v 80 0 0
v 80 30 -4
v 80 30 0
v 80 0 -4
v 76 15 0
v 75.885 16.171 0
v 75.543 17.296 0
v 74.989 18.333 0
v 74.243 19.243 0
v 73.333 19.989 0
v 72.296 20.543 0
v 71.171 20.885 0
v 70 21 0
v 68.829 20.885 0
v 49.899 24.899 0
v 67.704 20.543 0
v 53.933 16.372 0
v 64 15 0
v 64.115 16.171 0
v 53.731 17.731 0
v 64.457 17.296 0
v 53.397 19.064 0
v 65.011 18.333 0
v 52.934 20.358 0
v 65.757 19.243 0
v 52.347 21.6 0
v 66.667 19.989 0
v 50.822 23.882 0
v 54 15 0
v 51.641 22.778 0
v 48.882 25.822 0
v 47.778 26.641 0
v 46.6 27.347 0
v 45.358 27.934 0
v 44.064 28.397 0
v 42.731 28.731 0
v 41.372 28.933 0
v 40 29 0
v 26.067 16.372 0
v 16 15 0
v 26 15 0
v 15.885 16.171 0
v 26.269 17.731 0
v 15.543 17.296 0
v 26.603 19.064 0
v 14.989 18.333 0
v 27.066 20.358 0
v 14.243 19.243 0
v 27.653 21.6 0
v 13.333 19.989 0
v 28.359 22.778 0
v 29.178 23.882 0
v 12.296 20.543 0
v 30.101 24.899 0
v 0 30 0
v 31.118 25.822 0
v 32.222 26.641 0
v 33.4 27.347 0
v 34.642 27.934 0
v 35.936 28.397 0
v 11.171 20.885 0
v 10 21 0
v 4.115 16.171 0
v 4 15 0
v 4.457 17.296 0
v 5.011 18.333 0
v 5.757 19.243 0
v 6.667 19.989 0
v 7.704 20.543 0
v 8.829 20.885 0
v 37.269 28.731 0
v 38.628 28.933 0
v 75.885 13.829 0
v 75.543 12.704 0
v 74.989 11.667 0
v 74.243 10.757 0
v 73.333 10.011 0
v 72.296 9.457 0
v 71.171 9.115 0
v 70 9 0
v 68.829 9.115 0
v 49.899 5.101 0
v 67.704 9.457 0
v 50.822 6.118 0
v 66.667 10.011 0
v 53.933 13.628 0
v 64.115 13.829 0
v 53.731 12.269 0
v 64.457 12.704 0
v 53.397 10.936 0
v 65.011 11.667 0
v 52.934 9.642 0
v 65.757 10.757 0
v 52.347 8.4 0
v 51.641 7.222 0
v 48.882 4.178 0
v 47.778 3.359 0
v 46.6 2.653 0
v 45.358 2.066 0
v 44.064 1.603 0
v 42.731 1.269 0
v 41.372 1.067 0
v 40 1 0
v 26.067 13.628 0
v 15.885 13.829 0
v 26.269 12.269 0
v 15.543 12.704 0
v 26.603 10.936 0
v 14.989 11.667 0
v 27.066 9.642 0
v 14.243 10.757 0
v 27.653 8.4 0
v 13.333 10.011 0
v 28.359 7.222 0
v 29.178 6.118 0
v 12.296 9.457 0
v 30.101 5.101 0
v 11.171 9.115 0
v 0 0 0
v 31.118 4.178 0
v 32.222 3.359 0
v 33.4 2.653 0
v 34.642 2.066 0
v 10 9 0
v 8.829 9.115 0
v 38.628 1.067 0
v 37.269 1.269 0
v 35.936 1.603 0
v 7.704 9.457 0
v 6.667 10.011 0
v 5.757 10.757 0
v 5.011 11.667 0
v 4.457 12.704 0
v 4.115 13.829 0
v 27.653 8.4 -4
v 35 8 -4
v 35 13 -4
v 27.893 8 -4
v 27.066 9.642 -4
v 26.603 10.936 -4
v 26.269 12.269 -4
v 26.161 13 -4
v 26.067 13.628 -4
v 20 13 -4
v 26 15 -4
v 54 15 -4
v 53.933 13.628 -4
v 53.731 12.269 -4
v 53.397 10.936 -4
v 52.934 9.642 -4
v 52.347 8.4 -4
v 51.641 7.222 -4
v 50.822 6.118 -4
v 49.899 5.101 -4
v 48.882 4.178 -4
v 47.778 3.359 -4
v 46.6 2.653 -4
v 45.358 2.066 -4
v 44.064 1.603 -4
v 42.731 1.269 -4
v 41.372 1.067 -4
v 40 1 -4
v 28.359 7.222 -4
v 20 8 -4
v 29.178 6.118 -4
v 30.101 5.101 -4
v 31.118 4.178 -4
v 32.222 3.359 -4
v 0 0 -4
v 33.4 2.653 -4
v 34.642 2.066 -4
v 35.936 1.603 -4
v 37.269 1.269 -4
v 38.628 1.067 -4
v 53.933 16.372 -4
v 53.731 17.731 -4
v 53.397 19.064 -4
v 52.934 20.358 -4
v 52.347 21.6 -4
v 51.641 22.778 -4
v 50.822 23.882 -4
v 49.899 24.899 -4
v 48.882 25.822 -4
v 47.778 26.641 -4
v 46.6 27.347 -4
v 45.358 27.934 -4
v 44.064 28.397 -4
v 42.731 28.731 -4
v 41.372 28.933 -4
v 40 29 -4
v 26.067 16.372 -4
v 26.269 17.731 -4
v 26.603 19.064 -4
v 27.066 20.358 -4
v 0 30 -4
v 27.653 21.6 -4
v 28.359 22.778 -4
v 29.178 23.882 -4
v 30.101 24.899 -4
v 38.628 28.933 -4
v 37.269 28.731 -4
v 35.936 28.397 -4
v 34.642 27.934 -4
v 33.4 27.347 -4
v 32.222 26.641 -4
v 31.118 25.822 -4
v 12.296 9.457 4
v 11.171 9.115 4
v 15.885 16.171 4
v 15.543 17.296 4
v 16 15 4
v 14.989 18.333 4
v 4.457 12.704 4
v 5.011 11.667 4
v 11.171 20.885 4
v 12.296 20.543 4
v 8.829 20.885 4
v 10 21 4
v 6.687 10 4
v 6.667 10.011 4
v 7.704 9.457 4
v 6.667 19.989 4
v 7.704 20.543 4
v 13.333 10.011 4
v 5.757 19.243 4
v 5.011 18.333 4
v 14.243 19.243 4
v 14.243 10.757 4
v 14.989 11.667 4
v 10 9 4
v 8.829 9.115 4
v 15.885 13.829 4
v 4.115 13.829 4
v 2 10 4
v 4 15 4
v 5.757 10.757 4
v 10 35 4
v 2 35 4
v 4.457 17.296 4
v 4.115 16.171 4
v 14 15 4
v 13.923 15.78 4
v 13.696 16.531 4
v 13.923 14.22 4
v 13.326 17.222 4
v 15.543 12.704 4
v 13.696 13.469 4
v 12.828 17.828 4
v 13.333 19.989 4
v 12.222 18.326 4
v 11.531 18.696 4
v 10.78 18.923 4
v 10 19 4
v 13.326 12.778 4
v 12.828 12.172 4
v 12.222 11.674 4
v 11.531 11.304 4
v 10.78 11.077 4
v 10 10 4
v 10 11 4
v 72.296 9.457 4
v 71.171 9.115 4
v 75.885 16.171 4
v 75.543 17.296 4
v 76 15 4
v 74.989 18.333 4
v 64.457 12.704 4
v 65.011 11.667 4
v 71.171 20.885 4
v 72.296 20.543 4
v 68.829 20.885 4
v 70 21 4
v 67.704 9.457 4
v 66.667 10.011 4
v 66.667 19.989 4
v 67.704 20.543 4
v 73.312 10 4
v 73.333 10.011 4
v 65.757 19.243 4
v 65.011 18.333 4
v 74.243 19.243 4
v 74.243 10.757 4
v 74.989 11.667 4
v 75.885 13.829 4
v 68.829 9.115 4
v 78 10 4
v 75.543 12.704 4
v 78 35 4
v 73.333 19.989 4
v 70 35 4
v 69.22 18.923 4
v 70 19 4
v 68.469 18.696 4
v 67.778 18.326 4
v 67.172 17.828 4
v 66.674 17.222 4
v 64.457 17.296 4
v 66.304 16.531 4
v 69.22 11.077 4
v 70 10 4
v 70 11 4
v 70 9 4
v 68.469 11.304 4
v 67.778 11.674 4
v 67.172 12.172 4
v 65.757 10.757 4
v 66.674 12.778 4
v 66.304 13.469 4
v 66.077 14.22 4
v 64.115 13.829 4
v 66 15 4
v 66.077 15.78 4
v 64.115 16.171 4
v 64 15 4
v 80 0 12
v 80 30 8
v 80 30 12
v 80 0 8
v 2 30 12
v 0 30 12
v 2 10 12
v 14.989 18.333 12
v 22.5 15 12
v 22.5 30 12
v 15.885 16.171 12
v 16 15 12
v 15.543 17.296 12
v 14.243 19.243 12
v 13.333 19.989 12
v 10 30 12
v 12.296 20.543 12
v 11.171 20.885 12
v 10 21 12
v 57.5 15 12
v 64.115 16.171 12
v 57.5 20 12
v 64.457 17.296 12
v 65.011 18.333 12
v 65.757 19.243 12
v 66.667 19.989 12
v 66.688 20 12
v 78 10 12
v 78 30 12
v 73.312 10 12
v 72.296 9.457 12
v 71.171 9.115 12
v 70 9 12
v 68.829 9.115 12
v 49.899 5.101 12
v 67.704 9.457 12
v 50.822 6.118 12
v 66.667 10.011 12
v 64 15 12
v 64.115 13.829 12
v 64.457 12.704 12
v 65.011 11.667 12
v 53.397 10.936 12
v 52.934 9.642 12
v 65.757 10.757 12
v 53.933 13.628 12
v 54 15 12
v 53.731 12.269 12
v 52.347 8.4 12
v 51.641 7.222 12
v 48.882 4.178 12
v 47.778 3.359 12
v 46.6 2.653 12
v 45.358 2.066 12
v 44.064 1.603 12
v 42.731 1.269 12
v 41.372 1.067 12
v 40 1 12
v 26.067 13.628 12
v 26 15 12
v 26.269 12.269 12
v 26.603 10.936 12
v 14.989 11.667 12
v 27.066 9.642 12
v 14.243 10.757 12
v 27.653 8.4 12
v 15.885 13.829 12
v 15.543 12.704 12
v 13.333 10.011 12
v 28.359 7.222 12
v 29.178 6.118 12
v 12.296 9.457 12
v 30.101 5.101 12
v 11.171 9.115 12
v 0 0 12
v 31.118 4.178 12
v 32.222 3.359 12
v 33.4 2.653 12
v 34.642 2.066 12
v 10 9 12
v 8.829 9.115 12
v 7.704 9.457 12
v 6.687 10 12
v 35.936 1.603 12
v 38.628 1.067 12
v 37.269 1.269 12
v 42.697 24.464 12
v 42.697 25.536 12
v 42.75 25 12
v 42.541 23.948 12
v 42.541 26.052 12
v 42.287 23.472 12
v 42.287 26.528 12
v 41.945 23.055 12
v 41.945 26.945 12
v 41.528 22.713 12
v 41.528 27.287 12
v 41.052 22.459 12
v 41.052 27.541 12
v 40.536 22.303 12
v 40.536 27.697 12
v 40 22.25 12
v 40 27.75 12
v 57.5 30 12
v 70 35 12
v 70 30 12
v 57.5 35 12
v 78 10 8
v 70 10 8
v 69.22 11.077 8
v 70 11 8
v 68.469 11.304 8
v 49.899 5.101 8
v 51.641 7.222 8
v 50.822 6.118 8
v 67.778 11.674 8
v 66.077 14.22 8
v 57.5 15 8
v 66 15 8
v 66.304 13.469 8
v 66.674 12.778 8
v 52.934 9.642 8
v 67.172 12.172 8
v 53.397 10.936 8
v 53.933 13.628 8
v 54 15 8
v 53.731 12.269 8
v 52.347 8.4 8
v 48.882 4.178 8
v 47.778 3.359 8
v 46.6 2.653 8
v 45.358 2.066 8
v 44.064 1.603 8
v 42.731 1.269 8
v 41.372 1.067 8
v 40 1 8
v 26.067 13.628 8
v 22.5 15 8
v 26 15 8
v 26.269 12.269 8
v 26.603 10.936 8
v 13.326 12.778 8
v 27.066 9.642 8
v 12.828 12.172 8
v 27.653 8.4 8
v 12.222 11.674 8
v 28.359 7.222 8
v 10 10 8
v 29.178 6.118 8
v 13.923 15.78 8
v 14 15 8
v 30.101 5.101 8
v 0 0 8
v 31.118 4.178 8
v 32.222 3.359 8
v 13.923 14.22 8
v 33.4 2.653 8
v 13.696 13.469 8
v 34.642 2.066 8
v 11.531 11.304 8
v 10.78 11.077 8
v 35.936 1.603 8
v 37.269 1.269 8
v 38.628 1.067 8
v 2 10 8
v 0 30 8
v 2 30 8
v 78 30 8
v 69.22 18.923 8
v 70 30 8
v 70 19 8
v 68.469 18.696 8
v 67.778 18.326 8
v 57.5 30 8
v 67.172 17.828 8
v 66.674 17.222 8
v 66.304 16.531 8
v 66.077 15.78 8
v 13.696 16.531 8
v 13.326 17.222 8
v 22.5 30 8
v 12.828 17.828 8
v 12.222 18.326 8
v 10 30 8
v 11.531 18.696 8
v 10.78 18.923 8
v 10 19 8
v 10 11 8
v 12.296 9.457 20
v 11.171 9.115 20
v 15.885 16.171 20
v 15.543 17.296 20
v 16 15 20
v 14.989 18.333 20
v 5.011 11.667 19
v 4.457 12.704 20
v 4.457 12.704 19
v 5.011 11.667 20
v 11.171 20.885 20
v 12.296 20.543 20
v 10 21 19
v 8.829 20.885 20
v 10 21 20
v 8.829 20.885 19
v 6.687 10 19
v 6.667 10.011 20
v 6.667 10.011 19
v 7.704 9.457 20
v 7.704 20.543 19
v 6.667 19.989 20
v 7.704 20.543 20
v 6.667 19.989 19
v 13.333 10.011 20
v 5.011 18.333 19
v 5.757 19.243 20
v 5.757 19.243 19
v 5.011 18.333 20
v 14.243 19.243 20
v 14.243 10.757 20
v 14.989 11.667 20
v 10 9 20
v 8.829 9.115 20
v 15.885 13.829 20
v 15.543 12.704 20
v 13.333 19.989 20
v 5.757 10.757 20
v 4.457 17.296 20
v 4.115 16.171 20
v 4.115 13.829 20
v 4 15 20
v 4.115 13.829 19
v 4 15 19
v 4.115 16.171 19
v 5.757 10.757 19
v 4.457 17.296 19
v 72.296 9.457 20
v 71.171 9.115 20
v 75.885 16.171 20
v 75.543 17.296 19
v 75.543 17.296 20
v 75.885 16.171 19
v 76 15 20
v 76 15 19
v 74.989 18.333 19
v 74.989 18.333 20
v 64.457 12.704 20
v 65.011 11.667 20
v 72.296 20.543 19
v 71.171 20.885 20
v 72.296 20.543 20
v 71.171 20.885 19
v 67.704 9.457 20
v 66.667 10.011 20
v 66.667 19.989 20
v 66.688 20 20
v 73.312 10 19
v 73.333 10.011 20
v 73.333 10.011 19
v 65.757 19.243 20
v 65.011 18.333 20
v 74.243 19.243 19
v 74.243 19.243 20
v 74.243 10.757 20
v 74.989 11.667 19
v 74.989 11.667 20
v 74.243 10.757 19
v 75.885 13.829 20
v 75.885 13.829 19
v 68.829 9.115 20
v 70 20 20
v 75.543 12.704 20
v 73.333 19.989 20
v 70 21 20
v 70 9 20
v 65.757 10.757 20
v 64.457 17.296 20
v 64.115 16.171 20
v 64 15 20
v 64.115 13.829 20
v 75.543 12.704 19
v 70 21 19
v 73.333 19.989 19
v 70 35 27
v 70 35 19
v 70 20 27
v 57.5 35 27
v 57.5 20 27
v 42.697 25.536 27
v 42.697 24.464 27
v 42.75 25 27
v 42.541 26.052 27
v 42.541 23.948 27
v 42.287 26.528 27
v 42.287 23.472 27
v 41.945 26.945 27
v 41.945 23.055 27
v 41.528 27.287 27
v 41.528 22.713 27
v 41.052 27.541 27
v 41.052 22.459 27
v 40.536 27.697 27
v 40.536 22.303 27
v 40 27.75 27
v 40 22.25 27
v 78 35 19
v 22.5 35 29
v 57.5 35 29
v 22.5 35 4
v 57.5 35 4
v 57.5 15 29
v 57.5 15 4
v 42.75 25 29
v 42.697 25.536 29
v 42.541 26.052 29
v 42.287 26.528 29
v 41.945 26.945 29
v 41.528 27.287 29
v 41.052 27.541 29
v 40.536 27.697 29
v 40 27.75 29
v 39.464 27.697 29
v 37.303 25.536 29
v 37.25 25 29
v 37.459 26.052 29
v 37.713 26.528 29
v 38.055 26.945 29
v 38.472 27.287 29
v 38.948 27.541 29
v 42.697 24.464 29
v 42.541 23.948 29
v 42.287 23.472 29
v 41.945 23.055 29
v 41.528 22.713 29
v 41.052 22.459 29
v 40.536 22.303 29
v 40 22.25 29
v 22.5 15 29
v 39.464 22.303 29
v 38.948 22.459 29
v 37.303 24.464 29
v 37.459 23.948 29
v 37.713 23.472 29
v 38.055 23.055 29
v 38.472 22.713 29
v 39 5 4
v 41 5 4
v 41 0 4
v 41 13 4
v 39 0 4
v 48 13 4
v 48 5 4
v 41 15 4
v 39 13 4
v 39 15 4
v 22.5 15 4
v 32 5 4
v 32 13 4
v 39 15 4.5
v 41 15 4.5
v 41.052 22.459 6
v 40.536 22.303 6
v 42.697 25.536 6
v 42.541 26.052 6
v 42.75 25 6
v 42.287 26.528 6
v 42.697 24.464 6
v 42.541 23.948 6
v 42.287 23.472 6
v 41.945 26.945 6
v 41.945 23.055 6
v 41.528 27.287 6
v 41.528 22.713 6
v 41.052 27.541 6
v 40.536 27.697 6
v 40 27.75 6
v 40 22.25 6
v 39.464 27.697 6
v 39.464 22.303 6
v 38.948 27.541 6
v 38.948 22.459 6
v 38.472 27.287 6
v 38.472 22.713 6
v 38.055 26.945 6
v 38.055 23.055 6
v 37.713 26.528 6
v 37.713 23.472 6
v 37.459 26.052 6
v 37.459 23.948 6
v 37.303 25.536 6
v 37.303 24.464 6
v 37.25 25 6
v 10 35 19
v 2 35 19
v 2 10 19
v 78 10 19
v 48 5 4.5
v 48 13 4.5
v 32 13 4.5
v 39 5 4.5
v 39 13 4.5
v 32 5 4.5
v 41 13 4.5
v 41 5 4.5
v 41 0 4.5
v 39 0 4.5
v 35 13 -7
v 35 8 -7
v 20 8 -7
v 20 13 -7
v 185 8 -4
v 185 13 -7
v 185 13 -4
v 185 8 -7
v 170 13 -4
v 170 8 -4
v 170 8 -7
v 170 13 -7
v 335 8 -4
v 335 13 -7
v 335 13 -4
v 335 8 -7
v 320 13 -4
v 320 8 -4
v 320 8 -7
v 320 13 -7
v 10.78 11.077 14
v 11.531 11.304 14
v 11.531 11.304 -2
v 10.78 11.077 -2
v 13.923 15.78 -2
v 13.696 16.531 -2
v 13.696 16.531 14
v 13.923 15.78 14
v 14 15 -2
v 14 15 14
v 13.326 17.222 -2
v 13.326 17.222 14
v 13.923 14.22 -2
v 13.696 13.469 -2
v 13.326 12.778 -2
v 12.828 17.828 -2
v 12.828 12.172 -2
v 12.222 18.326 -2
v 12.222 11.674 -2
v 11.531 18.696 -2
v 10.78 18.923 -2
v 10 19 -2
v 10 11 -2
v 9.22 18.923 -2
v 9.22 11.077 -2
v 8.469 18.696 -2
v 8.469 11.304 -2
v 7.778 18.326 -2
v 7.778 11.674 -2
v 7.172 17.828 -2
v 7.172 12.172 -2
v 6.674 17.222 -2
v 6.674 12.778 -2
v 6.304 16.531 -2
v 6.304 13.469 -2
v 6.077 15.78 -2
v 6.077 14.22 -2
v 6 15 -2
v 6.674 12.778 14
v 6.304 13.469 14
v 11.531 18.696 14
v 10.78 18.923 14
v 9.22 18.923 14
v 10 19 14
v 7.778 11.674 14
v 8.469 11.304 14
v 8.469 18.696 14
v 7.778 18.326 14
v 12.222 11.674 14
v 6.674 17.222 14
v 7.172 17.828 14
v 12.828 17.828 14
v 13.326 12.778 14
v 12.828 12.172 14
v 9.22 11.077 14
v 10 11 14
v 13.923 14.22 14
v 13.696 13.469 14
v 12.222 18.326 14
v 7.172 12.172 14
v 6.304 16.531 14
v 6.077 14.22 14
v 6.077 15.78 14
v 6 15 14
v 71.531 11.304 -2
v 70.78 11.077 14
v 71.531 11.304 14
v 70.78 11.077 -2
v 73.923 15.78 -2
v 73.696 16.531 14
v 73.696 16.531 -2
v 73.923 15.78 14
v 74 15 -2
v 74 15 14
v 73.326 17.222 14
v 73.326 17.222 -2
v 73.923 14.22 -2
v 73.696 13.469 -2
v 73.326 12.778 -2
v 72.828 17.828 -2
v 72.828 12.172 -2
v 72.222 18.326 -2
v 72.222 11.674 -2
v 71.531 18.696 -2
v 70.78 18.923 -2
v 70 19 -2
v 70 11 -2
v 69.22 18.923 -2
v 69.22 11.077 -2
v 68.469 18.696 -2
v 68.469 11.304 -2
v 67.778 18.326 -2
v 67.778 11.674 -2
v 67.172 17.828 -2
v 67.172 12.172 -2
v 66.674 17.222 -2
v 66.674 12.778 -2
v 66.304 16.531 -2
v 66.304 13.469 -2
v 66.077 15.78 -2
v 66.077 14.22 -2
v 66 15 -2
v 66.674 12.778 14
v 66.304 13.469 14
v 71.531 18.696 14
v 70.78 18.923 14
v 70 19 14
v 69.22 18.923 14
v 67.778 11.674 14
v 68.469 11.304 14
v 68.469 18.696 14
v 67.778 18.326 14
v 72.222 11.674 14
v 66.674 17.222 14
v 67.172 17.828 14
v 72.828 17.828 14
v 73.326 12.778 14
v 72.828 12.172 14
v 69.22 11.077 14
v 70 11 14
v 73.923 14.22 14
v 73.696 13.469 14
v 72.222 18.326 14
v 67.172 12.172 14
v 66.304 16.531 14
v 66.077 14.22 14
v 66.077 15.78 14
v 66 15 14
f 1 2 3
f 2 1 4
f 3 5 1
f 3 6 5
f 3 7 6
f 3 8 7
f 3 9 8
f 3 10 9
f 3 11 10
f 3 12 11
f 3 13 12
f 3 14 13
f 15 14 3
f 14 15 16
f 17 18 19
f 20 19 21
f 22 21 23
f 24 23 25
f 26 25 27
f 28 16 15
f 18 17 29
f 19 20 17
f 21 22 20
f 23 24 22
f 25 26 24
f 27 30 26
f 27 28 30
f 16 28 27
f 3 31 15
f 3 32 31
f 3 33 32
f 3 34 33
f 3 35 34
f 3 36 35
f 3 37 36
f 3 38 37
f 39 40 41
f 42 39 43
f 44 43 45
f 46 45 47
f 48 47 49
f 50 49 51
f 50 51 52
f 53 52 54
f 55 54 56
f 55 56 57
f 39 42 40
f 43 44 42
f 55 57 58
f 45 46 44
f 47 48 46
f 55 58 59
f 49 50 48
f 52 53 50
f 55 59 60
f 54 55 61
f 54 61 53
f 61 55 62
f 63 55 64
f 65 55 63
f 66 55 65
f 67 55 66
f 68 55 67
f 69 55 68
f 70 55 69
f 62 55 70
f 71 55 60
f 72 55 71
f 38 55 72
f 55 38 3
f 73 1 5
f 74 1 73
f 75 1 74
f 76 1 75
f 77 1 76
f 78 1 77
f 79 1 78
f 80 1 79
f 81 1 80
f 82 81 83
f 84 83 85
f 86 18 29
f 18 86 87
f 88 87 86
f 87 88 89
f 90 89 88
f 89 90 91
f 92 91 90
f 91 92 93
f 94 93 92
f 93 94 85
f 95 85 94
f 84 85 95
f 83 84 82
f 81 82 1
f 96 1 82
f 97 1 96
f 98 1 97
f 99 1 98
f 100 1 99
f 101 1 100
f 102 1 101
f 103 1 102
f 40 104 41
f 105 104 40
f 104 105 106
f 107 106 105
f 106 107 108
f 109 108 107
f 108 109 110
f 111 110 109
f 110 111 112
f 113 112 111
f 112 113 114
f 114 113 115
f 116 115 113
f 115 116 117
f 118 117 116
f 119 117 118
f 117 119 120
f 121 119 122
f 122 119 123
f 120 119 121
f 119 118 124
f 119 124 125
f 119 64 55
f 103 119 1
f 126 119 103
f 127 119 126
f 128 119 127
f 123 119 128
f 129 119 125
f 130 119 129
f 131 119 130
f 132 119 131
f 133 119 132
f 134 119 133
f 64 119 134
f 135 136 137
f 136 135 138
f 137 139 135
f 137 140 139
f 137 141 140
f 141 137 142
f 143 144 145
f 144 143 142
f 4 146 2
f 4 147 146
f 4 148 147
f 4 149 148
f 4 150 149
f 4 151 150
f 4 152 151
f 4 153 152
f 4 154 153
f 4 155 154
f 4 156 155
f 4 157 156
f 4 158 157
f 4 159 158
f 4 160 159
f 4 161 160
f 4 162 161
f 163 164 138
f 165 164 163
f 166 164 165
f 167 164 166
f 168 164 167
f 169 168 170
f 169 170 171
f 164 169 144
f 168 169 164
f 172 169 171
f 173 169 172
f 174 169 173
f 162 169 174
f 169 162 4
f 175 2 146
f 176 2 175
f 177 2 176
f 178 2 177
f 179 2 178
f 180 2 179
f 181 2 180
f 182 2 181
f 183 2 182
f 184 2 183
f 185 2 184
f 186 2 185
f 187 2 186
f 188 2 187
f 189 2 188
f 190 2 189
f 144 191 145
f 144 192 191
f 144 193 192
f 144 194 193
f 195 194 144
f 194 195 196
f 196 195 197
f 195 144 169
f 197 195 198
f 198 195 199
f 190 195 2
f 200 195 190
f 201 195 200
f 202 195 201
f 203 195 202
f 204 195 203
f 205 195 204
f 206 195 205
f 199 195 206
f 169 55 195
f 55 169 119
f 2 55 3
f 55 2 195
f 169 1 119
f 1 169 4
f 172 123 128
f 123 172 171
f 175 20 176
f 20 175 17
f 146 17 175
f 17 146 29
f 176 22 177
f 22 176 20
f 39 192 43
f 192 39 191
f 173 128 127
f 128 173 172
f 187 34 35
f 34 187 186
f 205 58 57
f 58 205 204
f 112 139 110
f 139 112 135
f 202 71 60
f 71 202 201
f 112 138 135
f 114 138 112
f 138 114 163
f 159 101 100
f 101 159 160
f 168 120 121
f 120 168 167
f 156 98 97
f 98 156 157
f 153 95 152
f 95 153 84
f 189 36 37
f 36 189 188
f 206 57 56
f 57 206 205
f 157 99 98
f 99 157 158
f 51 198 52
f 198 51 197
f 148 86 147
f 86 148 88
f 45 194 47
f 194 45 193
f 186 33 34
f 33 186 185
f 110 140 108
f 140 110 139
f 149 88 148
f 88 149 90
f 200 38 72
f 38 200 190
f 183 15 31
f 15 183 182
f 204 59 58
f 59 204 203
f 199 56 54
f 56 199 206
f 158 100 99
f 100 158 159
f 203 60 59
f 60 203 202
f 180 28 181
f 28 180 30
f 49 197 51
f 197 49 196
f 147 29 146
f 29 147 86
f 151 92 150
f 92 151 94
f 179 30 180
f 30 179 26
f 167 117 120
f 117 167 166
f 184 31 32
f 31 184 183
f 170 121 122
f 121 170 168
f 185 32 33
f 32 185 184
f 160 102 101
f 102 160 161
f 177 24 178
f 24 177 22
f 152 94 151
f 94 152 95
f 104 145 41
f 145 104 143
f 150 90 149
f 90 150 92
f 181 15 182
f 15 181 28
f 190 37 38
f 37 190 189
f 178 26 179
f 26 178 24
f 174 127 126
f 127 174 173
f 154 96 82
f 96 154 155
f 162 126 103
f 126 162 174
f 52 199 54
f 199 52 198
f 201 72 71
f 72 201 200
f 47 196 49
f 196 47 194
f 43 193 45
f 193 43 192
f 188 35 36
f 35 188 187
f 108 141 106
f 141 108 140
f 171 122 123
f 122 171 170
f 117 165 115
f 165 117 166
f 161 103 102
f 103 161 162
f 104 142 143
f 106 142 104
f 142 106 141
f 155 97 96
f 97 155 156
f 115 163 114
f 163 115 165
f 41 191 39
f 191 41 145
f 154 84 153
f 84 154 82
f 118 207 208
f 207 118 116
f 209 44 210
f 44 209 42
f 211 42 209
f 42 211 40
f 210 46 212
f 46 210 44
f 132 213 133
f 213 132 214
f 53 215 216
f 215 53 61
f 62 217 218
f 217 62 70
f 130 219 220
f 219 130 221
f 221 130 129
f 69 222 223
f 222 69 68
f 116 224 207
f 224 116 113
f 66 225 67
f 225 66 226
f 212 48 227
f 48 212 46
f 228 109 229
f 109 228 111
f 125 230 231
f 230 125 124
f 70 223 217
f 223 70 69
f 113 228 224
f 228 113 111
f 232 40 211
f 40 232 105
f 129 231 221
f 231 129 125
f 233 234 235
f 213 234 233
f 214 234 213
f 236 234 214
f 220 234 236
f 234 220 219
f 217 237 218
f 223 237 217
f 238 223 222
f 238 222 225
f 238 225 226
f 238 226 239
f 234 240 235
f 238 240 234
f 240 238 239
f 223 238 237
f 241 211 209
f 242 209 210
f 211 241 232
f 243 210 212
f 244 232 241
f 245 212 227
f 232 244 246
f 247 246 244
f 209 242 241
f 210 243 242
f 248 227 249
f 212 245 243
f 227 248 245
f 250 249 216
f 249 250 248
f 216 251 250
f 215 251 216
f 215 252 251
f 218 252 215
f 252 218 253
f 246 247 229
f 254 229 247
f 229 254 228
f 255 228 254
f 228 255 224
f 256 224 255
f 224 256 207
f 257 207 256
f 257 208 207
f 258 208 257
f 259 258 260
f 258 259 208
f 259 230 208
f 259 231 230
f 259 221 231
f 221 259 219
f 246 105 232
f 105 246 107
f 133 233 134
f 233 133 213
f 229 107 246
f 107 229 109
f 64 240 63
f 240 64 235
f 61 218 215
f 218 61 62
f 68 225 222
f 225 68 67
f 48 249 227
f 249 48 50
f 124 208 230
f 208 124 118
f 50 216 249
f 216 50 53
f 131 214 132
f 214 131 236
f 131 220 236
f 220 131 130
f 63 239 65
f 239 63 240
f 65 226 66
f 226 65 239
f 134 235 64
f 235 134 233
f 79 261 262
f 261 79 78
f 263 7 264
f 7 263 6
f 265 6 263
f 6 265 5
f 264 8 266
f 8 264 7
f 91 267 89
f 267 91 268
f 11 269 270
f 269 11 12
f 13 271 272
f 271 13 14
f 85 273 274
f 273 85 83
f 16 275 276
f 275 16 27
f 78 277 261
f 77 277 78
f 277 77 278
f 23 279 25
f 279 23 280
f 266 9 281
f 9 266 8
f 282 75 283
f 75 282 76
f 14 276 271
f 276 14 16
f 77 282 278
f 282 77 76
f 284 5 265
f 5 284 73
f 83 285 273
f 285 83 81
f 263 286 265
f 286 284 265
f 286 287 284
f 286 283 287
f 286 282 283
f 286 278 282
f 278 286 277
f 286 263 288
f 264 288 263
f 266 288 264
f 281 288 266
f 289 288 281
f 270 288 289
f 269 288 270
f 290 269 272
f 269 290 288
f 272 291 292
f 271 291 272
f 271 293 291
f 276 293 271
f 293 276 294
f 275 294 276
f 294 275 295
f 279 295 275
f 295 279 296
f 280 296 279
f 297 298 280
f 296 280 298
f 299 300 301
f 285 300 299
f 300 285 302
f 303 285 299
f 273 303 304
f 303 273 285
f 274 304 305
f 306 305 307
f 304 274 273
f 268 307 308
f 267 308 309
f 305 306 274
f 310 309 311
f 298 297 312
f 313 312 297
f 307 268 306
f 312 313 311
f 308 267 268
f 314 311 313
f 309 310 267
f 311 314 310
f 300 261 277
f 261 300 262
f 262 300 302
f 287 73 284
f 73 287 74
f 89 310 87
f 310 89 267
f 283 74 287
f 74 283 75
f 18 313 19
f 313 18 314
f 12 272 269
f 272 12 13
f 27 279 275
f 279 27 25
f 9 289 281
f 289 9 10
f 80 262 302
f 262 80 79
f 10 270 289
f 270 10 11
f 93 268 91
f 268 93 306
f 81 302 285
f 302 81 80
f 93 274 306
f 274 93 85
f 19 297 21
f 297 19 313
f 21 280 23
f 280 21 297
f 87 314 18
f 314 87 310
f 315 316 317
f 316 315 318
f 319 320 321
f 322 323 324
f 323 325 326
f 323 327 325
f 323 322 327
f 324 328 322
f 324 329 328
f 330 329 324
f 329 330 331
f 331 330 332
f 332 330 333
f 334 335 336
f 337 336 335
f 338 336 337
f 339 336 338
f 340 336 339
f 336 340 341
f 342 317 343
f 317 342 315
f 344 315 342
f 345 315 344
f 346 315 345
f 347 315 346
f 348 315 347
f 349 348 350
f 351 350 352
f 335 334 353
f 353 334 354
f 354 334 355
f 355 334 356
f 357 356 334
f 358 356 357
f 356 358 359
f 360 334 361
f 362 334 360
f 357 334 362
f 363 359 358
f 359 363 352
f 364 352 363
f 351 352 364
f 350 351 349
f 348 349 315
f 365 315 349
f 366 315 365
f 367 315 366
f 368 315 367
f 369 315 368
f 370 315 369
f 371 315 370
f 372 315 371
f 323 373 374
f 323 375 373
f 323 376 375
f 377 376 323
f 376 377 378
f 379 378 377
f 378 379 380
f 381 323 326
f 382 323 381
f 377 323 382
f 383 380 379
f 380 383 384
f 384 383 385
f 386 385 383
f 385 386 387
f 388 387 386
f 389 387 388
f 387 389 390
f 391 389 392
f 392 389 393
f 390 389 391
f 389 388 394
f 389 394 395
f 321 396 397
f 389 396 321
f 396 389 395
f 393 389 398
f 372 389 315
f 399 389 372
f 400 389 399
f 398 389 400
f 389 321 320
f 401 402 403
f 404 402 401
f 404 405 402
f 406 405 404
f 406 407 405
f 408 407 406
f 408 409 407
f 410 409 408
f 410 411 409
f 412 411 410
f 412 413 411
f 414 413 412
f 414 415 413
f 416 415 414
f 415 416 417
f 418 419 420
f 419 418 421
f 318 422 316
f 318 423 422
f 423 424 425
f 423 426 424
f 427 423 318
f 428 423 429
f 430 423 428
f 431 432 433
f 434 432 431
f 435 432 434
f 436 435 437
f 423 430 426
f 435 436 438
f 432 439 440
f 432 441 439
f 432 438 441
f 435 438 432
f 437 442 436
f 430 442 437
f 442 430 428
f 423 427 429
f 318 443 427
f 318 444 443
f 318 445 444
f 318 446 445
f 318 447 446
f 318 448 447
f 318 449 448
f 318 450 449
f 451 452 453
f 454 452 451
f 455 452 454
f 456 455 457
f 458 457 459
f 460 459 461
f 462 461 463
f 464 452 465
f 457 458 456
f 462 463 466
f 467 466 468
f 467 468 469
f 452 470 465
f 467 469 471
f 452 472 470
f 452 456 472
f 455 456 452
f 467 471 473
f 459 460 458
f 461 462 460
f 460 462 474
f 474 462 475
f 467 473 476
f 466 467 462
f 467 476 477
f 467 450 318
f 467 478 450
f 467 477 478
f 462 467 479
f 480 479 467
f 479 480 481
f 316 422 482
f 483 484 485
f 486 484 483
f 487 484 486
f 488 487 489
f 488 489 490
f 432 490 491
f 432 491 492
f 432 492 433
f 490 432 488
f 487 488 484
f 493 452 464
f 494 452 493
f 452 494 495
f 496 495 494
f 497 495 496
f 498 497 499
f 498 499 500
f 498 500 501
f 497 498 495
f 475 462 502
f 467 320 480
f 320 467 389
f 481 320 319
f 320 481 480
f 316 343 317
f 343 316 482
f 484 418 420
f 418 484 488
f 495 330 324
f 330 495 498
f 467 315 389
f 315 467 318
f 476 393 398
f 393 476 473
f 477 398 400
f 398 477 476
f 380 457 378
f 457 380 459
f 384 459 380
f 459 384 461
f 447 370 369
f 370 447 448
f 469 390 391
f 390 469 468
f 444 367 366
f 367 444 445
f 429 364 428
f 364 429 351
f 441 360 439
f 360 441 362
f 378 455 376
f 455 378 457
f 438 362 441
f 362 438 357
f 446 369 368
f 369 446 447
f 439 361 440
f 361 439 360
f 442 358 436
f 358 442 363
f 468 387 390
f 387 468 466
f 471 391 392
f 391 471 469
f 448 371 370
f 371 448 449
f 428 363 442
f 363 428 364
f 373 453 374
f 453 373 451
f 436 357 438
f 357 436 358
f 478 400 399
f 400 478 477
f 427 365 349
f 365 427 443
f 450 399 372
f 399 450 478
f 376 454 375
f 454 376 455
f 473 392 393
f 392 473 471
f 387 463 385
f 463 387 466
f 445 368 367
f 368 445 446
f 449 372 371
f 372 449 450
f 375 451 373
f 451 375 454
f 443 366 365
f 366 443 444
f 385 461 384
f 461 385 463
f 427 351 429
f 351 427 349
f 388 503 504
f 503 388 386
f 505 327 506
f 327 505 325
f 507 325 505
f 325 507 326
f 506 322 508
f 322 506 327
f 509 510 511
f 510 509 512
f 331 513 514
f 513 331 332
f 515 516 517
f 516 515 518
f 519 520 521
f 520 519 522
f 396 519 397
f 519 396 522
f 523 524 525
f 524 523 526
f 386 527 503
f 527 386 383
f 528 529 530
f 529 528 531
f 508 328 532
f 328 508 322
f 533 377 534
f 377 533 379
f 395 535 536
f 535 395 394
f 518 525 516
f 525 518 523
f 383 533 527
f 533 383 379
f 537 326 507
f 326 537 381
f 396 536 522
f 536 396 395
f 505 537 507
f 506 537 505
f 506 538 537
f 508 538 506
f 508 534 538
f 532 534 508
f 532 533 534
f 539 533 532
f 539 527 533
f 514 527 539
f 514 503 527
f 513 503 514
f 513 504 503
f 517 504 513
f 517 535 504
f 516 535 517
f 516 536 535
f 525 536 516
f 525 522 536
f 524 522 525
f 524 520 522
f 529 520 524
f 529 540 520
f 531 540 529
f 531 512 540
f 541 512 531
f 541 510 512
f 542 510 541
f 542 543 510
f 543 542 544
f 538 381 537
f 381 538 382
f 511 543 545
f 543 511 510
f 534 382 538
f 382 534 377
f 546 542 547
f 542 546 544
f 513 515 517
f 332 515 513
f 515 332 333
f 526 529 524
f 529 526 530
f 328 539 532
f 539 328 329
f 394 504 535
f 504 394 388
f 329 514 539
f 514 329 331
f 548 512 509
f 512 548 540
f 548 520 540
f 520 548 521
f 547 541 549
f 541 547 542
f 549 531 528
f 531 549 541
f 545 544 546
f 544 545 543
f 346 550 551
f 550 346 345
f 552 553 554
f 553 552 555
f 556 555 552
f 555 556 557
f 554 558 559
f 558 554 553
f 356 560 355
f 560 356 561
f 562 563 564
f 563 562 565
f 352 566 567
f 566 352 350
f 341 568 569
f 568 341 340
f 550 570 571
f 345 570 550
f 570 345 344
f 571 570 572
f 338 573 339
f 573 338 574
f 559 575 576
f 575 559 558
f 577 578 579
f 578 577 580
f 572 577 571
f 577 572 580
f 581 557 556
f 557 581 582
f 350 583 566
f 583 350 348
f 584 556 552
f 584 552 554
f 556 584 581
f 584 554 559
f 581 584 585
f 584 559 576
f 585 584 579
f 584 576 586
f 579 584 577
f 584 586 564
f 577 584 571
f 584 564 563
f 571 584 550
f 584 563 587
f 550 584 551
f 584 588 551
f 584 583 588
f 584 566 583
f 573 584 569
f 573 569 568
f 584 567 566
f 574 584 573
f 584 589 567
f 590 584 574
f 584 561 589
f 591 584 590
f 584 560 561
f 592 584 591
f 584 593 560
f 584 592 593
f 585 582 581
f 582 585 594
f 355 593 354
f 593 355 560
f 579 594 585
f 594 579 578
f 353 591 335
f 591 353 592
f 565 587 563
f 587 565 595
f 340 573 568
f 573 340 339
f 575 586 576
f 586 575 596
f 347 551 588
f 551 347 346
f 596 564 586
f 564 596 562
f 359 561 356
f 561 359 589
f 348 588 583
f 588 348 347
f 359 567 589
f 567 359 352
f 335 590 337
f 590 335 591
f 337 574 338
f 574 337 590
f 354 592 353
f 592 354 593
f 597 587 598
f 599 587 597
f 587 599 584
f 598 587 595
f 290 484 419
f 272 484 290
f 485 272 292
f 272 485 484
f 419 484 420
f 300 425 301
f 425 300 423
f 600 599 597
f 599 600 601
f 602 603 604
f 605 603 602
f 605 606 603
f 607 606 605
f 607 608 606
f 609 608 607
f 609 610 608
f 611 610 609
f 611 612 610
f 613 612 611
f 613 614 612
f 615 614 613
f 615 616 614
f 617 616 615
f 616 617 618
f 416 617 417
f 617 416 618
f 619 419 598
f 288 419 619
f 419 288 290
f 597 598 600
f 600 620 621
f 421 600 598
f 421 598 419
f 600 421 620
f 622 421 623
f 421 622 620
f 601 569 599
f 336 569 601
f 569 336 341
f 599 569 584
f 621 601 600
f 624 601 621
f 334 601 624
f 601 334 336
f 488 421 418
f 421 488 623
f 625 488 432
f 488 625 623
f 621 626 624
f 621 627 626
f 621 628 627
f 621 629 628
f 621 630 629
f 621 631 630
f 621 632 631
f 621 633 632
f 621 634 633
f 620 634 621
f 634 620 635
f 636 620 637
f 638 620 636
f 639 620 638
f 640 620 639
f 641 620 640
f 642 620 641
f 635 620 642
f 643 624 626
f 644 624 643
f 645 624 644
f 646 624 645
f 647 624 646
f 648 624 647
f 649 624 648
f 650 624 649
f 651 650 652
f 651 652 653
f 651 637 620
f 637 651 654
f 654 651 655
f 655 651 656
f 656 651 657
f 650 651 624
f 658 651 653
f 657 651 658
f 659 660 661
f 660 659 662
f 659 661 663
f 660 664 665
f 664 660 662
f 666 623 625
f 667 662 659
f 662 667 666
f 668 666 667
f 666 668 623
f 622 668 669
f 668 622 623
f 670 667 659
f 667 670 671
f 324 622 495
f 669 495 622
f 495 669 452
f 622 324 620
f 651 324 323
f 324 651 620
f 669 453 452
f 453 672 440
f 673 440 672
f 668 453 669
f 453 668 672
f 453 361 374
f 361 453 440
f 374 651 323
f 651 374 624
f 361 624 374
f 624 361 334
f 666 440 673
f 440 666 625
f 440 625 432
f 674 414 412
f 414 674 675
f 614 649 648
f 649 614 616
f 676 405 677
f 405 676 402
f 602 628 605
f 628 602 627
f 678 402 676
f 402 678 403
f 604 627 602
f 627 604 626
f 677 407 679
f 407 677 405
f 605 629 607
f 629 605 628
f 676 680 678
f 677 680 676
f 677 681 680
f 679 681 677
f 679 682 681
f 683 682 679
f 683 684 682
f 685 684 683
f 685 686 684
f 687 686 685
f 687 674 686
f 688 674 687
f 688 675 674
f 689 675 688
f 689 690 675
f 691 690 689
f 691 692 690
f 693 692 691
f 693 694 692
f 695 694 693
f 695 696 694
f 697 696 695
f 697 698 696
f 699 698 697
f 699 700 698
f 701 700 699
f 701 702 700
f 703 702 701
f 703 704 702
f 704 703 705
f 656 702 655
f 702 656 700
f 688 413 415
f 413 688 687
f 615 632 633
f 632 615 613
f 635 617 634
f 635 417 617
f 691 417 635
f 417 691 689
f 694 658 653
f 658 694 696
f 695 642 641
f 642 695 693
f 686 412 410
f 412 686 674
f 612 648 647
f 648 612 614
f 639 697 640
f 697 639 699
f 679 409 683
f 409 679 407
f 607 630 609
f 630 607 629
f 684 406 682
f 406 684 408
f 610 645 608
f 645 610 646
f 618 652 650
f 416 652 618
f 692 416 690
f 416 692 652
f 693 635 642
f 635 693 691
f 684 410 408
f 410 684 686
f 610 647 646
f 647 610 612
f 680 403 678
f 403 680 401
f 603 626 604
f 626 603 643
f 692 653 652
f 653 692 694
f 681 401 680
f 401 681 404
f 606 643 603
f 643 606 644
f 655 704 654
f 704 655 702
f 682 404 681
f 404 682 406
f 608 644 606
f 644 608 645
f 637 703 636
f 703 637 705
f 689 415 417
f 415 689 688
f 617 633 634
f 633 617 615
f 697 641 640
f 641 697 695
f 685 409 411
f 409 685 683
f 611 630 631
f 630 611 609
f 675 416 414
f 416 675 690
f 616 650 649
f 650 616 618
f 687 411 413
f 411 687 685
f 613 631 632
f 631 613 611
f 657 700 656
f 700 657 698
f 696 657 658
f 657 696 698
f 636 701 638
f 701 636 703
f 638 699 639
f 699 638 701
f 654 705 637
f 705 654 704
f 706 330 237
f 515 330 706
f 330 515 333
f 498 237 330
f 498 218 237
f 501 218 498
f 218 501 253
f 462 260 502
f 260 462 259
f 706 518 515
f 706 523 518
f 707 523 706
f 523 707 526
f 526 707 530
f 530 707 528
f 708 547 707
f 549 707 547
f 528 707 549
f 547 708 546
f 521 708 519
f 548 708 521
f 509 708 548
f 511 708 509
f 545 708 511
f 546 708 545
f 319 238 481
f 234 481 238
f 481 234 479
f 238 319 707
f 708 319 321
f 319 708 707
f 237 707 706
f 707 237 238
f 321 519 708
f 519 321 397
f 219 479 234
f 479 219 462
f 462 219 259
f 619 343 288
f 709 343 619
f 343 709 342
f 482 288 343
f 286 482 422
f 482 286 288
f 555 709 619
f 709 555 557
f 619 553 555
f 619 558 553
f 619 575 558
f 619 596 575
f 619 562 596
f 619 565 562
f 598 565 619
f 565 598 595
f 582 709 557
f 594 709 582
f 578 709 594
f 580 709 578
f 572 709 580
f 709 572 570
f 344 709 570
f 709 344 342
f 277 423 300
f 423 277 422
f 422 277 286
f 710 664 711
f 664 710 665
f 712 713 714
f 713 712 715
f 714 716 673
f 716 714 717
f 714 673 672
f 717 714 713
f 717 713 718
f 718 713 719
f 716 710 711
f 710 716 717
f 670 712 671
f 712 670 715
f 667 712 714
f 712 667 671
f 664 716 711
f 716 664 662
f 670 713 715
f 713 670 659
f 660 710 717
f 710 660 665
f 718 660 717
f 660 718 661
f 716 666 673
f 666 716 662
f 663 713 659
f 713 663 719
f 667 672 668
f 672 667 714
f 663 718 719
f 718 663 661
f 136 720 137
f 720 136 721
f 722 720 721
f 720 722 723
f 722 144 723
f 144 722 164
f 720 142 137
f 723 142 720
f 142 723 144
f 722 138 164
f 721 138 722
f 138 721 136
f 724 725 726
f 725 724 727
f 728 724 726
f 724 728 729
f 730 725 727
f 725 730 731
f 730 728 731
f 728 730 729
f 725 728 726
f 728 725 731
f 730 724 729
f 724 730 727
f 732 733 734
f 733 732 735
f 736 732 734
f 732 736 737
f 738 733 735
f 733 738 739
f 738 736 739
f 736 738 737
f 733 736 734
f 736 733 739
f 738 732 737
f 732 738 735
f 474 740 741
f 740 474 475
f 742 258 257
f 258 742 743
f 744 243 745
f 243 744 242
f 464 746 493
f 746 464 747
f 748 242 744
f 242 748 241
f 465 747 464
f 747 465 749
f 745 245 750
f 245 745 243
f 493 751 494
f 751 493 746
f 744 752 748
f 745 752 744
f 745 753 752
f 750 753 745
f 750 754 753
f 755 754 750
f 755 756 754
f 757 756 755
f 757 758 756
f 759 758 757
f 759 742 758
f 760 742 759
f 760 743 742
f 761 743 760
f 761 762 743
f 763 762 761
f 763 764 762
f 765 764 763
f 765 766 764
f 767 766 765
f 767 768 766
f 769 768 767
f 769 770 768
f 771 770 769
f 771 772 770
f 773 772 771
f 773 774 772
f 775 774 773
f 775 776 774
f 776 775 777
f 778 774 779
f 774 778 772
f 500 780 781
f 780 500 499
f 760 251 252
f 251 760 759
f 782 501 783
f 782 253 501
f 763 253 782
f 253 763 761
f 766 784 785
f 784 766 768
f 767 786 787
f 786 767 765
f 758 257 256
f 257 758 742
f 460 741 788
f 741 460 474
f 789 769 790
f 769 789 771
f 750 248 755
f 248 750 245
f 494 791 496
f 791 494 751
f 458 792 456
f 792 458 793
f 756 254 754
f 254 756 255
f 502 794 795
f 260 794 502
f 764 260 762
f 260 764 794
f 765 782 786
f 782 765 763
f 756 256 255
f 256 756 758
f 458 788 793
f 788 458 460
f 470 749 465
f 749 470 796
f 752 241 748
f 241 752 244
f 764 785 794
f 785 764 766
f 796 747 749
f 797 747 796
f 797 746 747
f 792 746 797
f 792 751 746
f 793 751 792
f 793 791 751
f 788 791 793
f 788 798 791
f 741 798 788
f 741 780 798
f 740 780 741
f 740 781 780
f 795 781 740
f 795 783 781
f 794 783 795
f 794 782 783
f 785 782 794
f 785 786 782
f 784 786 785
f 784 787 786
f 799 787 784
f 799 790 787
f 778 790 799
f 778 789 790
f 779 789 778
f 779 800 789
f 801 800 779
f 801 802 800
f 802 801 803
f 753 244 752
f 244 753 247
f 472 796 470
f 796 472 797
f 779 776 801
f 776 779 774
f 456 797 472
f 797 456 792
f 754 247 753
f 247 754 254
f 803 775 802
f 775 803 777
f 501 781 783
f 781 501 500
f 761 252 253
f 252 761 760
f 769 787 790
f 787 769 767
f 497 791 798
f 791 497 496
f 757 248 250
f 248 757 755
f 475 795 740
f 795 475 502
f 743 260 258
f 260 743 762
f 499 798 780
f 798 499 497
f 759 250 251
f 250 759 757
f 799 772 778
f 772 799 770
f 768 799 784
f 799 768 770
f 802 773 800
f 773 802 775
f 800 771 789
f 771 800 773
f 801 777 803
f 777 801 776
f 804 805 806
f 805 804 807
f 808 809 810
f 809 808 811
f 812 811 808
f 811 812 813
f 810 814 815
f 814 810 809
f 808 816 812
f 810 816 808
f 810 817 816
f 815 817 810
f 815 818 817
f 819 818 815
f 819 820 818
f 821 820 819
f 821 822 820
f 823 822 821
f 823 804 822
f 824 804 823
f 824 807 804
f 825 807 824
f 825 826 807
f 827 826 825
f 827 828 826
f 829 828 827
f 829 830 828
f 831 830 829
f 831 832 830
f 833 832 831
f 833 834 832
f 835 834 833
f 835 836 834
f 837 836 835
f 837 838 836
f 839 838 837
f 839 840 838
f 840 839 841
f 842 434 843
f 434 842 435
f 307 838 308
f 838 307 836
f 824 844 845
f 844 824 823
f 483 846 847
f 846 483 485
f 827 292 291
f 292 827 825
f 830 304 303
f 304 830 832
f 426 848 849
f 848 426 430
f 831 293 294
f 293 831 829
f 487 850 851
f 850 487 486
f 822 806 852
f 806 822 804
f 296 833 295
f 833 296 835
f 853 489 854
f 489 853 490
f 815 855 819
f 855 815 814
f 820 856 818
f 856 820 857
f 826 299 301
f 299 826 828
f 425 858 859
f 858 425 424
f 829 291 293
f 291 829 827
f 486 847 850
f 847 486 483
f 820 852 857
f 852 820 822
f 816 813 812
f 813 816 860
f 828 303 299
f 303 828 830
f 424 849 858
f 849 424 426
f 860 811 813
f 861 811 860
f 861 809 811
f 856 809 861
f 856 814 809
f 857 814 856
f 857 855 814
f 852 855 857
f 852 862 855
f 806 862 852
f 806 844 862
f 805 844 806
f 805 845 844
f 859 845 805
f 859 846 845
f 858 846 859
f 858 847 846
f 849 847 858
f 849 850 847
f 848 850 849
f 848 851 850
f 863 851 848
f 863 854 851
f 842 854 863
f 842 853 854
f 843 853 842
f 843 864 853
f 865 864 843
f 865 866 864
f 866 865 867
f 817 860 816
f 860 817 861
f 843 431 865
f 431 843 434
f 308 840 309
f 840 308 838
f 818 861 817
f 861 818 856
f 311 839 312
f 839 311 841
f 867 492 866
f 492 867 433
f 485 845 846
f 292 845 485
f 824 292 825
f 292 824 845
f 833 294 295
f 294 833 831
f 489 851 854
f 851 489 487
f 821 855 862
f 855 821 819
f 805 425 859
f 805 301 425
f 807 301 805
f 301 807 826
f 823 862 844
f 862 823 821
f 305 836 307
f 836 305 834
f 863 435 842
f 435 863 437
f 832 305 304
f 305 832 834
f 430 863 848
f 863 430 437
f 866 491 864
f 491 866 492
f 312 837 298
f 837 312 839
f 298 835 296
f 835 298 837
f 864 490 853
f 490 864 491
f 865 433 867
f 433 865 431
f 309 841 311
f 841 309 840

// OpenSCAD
// INTEGRATED ANTENNA ANALYZER - BOOM MOUNT ADAPTER
// Universal mounting adapter for antenna boom or tower attachment
// Accommodates 1" round or 1" square aluminum boom

// Boom dimensions (adaptive)
boom_diameter_round = 25.4;    // 1" round boom in mm
boom_width_square = 25.4;      // 1" square boom, 25.4mm sides

// Adapter dimensions
adapter_thickness = 4;         // 4mm thickness for aluminum
clamp_width = 80;              // Clamp span (two halves)
clamp_height = 30;             // Height to accommodate boom + fasteners

// U-bolt specifications (typical boom clamp)
ubolt_diameter = 8;            // 8mm steel U-bolt
fastener_spacing = 60;         // Center-to-center of fastener holes

// Attachment to analyzer
analyzer_tripod_boss_diameter = 12;  // 1/4"-20 UNC threaded mount boss
analyzer_thread_size = 5;      // M5 equivalent (1/4"-20 UNC)

// Clamp jaw specifications
jaw_inner_radius = 14;         // Radius of curved jaw (accommodates 1" boom)
jaw_outer_radius = 20;         // Outer radius of jaw
jaw_thickness = 4;             // Thickness of clamping jaw

module boom_clamp_upper_jaw() {
  // Upper half of boom clamp (removable/hinged)
  // Curves to fit 1" round or square boom

  // Main clamp body
  difference() {
    // Outer envelope
    translate([0, 0, 0])
      cube([clamp_width, clamp_height, adapter_thickness]);

    // Curved inner surface (fits boom contour)
    translate([clamp_width/2, clamp_height/2, -2])
      cylinder(h = adapter_thickness + 4, r = jaw_inner_radius, $fn = 64);
  }

  // U-bolt fastener pads
  // Two mounting holes for U-bolt nuts

  ubolt_y_offset = 15;  // Distance from clamp center

  // Left fastener boss
  translate([clamp_width/2 - fastener_spacing/2, ubolt_y_offset, adapter_thickness])
    cylinder(h = 8, d = 12, $fn = 32);

  // Right fastener boss
  translate([clamp_width/2 + fastener_spacing/2, ubolt_y_offset, adapter_thickness])
    cylinder(h = 8, d = 12, $fn = 32);

  // Center vertical mounting post (for analyzer tripod mount)
  translate([clamp_width/2, clamp_height - 10, adapter_thickness])
    cube([30, 15, 15]);
}

module boom_clamp_lower_jaw() {
  // Lower half of boom clamp (stationary base)
  // Matches upper jaw, provides structural base

  difference() {
    // Outer envelope
    translate([0, 0, -adapter_thickness])
      cube([clamp_width, clamp_height, adapter_thickness]);

    // Curved inner surface (matches upper jaw)
    translate([clamp_width/2, clamp_height/2, -adapter_thickness - 2])
      cylinder(h = adapter_thickness + 4, r = jaw_inner_radius, $fn = 64);
  }

  // U-bolt fastener pads (match upper jaw)
  ubolt_y_offset = 15;

  translate([clamp_width/2 - fastener_spacing/2, ubolt_y_offset, -adapter_thickness])
    cylinder(h = 8, d = 12, $fn = 32);

  translate([clamp_width/2 + fastener_spacing/2, ubolt_y_offset, -adapter_thickness])
    cylinder(h = 8, d = 12, $fn = 32);
}

module center_mounting_post() {
  // Central post that connects to analyzer tripod mount
  // 1/4"-20 UNC threaded hole for analyzer boss

  post_width = 35;
  post_height = 25;
  post_z_offset = adapter_thickness;  // Mounts on top of lower jaw

  difference() {
    // Main post
    translate([clamp_width/2 - post_width/2, clamp_height - 15, post_z_offset])
      cube([post_width, 20, post_height]);

    // Threaded hole for analyzer mount
    translate([clamp_width/2, clamp_height - 5, post_z_offset + 2])
      cylinder(h = post_height, d = analyzer_thread_size + 0.5, $fn = 32);
  }
}

module fastener_holes() {
  // Clearance holes for U-bolt fasteners (8mm diameter)

  ubolt_y = 15;
  hole_depth = 12;

  // Left fastener hole
  translate([clamp_width/2 - fastener_spacing/2, ubolt_y, -2])
    cylinder(h = hole_depth + 4, d = ubolt_diameter, $fn = 32);

  // Right fastener hole
  translate([clamp_width/2 + fastener_spacing/2, ubolt_y, -2])
    cylinder(h = hole_depth + 4, d = ubolt_diameter, $fn = 32);
}

module cable_routing_clips() {
  // Clips to route analyzer power/signal cables along boom
  // Prevents cable movement and stress on connectors

  clip_spacing = 150;   // Spacing along boom

  // Bottom-mounted clips (every ~150mm along boom)
  for (i = [0:2]) {
    clip_x = (i * clip_spacing) + 20;
    clip_y = 8;
    clip_z = -adapter_thickness - 3;

    translate([clip_x, clip_y, clip_z])
      cube([15, 5, 3]);  // Thin clip protruding downward
  }
}

module labeling_and_markings() {
  // Surface features for clarity (engraved or raised)
  // Indicates clamp orientation and analyzer position

  text_depth = 0.5;

  // "UP" arrow indicating correct mounting orientation
  translate([clamp_width/2 - 8, 5, adapter_thickness])
    cube([16, 8, text_depth]);

  // Center line marking (helps with boom centering)
  translate([clamp_width/2 - 1, 0, adapter_thickness])
    cube([2, clamp_height, text_depth]);
}

module side_cable_guides() {
  // Side guides to keep analyzer cables neat
  // Prevents RF interference from cable radiation

  guide_height = 15;
  guide_width = 8;

  // Left side guide
  translate([2, clamp_height - 20, adapter_thickness])
    cube([guide_width, 25, guide_height]);

  // Right side guide
  translate([clamp_width - 2 - guide_width, clamp_height - 20, adapter_thickness])
    cube([guide_width, 25, guide_height]);
}

module assembly() {
  // Complete boom mount assembly

  // Lower jaw (stationary base)
  boom_clamp_lower_jaw();

  // Upper jaw (removable)
  translate([0, 0, adapter_thickness * 2])  // Offset for visualization
    boom_clamp_upper_jaw();

  // Center mounting post
  center_mounting_post();

  // Cable guides
  side_cable_guides();

  // Labeling
  labeling_and_markings();

  // Cable routing clips
  cable_routing_clips();
}

// RENDER ASSEMBLY
difference() {
  assembly();
  fastener_holes();
}

// Show boom position for reference (visualization only)
%translate([clamp_width/2, clamp_height/2, -5])
  cylinder(h = 40, d = boom_diameter_round, $fn = 32);  // 1" round boom visualization

// ASSEMBLY INSTRUCTIONS FOR USER:
// 1. Slide analyzer base adapter around 1" boom
// 2. Upper and lower jaw halves sandwich boom
// 3. Insert U-bolt (8mm) through fastener holes
// 4. Tighten U-bolt nuts evenly (alternating sides)
// 5. Do NOT over-tighten (avoid distorting boom)
// 6. Connect analyzer to center post via 1/4"-20 screw
// 7. Route DUT/REF cables along side guides
// 8. Secure cables with small zip ties through clips
// 9. Analyzer hangs vertically (display faces down toward operator)
// 10. Orient DUT/REF ports: DUT toward antenna, REF toward reference

// ALTERNATIVE MOUNTING OPTIONS:
// A) Direct antenna attachment: mount analyzer at antenna base
// B) Tripod mounting: use standard photography tripod (1/4"-20 female socket)
// C) Boom mounting: this adapter (best for mobile antenna measurements)

// NOTES FOR MANUFACTURING:
// 1. Print in strong PETG or nylon (load-bearing component)
// 2. Layer height: 0.2mm for strength
// 3. Infill: 100% for structural rigidity (clamp forces are significant)
// 4. Orientation: print with clamp jaws vertical (optimize layer strength)
// 5. Support: minimal (clamp interior only)
// 6. Post-processing: sand smooth, especially clamp inner surface
// 7. Optional: reinforce with metal insert sleeves at fastener points
// 8. Field use: test clamp on non-critical antenna boom first
// 9. Maintenance: periodically re-tighten U-bolt (vibration can loosen fasteners)
// 10. Boom compatibility:
//     - 1" round aluminum boom: standard OD = 25.4mm (works as-is)
//     - 1" square aluminum boom: fits in circular clamp (add padding)
//     - Other sizes: scale jaw radius in code (jaw_inner_radius parameter)

// TORQUE SPECIFICATION FOR U-BOLT:
// 8mm stainless steel U-bolt with M8 nuts
// Recommended torque: 12-15 N·m (avoid over-tightening aluminum boom)
// Tools needed: 13mm wrench or socket, torque wrench
